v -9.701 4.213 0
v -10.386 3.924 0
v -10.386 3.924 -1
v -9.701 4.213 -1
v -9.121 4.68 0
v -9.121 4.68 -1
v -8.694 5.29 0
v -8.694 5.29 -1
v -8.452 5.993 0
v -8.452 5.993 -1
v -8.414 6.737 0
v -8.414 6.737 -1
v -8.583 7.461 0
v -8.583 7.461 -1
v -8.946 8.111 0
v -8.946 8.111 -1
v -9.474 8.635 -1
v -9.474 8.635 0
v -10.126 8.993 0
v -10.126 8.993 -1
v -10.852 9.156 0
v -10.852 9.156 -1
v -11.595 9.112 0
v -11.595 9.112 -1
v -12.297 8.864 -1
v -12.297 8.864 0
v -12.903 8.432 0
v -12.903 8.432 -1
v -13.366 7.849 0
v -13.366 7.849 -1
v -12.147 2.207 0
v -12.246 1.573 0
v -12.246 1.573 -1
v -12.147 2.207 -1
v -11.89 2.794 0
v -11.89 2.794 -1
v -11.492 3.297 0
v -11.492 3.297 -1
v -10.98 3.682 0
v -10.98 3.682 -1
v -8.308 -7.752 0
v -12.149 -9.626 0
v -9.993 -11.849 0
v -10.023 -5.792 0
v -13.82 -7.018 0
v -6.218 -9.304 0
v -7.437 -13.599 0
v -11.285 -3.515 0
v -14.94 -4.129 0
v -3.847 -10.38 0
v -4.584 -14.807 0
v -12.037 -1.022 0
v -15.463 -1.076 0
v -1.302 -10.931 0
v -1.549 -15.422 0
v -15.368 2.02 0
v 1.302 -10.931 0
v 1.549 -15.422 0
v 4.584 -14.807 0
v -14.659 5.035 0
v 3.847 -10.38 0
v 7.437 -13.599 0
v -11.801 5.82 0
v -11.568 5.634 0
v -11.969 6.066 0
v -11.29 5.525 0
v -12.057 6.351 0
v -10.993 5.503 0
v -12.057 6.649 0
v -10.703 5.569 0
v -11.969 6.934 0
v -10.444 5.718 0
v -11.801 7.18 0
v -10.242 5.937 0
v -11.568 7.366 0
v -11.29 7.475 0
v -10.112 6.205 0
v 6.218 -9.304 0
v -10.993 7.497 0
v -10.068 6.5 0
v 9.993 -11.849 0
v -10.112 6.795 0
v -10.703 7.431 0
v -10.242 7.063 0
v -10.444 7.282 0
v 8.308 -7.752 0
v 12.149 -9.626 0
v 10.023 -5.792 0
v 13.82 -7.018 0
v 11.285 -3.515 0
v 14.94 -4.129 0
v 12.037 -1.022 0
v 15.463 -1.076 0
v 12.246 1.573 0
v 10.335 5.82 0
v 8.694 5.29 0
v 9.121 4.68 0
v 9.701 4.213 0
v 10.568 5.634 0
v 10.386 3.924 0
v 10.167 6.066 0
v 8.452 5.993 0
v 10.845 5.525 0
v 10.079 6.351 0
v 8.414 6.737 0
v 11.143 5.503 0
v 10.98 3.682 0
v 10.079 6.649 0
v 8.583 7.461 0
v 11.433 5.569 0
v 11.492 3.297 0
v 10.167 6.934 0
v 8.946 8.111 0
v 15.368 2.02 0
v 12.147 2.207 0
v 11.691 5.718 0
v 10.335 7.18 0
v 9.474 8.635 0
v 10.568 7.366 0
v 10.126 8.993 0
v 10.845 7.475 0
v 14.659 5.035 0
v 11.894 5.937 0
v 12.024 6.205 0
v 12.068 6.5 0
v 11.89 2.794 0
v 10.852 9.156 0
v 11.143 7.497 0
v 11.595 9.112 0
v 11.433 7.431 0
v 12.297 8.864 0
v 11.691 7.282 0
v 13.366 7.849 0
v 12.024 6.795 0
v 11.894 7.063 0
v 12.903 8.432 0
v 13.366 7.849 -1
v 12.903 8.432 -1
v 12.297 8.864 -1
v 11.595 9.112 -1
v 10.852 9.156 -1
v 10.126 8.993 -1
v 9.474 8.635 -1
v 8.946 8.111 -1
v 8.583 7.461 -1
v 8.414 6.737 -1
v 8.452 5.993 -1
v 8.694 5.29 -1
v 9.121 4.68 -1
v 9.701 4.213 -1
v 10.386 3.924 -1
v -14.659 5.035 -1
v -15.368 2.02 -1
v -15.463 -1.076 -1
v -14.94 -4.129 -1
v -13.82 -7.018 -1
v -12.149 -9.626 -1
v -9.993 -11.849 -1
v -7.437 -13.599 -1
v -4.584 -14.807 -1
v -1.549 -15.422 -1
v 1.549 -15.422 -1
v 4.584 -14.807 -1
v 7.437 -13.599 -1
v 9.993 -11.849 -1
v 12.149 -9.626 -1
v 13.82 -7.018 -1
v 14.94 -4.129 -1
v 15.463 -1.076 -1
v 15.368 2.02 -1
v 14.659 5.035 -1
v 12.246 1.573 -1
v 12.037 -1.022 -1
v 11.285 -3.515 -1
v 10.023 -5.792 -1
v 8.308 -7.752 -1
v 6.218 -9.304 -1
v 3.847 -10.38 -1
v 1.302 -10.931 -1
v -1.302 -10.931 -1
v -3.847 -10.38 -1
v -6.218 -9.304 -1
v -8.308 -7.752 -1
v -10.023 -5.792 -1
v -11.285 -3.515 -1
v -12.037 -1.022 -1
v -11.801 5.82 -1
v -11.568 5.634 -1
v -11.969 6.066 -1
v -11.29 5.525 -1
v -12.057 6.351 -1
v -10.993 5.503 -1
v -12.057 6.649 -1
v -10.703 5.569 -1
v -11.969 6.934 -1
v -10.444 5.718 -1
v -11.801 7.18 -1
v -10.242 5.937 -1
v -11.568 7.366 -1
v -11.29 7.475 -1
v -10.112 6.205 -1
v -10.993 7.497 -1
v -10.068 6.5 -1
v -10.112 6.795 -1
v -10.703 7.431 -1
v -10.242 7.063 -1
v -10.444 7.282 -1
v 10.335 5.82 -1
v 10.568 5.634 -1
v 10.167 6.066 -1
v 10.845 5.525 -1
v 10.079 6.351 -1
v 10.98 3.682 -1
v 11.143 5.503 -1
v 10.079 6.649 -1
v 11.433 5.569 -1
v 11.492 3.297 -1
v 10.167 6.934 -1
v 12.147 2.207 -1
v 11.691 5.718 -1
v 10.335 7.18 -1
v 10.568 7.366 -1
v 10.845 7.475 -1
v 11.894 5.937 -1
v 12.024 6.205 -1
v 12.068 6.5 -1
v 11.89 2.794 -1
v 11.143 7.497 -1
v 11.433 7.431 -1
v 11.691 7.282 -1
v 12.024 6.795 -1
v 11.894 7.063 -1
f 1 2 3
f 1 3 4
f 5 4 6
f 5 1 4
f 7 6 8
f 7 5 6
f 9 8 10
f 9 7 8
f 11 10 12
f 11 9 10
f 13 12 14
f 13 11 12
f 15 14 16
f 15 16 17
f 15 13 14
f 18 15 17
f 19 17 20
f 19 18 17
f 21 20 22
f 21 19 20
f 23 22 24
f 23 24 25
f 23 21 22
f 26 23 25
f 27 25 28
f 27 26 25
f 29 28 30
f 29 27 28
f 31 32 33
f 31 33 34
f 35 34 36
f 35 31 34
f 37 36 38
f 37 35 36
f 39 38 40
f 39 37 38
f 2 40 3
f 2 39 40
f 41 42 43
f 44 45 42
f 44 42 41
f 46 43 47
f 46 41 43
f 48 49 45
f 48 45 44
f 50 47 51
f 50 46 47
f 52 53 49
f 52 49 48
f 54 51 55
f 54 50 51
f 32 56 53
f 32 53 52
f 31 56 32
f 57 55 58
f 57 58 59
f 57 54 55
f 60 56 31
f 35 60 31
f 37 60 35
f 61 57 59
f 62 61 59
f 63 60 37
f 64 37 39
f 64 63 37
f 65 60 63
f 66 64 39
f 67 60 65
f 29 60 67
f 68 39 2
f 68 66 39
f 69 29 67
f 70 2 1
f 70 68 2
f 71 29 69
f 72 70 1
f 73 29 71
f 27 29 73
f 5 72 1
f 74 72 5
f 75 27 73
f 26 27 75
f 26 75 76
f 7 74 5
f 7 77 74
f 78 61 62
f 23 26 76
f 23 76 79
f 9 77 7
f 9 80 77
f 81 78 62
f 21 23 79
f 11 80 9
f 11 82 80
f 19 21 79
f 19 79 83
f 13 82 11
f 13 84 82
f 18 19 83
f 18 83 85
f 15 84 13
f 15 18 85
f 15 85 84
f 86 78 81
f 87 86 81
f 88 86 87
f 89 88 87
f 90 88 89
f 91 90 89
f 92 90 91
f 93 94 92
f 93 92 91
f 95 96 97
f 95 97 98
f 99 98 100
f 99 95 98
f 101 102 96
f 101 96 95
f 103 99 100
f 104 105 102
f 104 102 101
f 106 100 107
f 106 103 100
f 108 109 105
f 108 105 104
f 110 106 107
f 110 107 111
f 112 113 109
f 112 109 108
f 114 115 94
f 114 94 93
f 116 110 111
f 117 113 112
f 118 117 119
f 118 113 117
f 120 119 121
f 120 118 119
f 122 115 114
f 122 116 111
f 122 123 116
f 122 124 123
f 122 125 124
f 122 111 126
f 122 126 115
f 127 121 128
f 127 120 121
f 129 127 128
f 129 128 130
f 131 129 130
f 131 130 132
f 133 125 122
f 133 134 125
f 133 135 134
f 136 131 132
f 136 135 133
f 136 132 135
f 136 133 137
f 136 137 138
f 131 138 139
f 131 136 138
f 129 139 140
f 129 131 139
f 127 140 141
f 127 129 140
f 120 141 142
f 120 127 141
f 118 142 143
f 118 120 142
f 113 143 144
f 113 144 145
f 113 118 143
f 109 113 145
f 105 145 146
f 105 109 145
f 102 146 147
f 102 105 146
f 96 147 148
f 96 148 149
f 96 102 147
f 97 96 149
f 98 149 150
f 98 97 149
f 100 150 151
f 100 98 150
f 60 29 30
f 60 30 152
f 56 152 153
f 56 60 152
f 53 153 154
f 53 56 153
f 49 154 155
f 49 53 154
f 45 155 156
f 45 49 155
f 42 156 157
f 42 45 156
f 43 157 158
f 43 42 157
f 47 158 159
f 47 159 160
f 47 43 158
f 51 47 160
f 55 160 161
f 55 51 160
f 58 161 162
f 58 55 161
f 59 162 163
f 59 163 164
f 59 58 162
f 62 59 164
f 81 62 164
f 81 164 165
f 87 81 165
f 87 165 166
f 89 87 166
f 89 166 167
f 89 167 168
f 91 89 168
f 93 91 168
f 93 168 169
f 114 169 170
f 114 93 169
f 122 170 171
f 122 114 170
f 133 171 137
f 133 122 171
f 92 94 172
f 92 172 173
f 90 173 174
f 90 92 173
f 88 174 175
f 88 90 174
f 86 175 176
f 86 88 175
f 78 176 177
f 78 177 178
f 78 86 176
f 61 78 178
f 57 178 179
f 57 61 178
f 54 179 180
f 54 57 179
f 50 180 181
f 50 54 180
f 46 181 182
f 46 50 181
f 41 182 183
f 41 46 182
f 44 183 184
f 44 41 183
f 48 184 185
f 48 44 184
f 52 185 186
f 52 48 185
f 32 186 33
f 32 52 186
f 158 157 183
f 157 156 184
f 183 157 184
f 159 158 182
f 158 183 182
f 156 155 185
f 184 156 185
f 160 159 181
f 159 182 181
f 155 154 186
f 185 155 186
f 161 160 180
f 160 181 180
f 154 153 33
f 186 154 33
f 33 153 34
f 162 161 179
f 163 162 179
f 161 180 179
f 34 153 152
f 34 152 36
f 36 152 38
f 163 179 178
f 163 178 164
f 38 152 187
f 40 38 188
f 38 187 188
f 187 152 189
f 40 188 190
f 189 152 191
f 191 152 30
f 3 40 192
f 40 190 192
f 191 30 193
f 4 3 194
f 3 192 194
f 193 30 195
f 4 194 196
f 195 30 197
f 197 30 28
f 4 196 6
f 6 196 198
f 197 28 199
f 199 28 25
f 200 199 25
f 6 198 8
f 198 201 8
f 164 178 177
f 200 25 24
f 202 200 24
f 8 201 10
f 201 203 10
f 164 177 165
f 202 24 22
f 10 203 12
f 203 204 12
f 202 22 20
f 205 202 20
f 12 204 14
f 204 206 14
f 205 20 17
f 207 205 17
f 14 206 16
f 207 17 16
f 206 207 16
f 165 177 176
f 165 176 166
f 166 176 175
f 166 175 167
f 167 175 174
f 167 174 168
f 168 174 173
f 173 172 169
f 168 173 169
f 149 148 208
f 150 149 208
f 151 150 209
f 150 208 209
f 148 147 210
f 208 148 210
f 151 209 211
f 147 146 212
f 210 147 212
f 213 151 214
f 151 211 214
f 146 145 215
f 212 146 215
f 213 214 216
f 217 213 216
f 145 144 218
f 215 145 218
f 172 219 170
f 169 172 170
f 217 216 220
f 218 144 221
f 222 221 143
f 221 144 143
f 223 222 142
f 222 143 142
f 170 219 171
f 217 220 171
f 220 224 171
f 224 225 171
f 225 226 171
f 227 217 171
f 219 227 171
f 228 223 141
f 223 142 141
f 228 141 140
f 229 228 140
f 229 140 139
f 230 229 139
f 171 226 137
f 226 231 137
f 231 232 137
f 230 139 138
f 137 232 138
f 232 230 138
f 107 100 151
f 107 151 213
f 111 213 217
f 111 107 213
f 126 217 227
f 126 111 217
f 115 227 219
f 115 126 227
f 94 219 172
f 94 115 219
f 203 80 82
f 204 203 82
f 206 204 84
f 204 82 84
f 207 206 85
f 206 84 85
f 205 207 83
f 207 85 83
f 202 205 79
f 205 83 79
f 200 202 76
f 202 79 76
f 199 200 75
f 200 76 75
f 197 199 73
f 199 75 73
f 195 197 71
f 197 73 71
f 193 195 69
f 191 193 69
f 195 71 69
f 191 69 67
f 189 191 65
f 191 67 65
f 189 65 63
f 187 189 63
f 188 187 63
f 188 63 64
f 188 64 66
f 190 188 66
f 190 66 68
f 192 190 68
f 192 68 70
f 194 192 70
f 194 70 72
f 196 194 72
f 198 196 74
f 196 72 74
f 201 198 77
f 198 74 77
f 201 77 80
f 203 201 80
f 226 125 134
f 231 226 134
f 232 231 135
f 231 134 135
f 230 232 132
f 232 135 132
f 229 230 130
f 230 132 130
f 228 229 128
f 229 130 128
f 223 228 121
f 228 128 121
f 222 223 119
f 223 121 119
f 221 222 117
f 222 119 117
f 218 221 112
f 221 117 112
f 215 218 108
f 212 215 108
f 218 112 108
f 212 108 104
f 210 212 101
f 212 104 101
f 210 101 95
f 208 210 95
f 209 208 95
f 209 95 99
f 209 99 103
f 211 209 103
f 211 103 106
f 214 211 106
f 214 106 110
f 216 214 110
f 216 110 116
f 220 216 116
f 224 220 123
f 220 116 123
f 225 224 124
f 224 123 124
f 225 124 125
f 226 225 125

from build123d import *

# Parameters (mm, degrees)
SKETCH_1_R      = 1
EXTRUDE_1_DEPTH = 1


with BuildPart() as part:
    # Эскиз1 → Бобышка-Вытянуть1 (new body)
    with BuildSketch(Plane.XY):
        with BuildLine():
            ThreePointArc((-13.365556031, 7.849325575), (0, -15.5), (13.365556031, 7.849325575))
            ThreePointArc((13.365556031, 7.849325575), (8.94560833, 8.110945689), (10.386242309, 3.924186023))
            ThreePointArc((10.386242309, 3.924186023), (11.7073461, 3.058360422), (12.245730412, 1.573398627))
            ThreePointArc((12.245730412, 1.573398627), (0, -11), (-12.245730412, 1.573398627))
            ThreePointArc((-12.245730412, 1.573398627), (-11.7073461, 3.058360422), (-10.386242309, 3.924186023))
            ThreePointArc((-10.386242309, 3.924186023), (-8.94560833, 8.110945689), (-13.365556031, 7.849325575))
        make_face()
        with Locations((-11.067971811, 6.5)):
            Circle(SKETCH_1_R, mode=Mode.SUBTRACT)
        with Locations((11.067971811, 6.5)):
            Circle(SKETCH_1_R, mode=Mode.SUBTRACT)
    extrude(amount=-EXTRUDE_1_DEPTH)


solid = part.part
